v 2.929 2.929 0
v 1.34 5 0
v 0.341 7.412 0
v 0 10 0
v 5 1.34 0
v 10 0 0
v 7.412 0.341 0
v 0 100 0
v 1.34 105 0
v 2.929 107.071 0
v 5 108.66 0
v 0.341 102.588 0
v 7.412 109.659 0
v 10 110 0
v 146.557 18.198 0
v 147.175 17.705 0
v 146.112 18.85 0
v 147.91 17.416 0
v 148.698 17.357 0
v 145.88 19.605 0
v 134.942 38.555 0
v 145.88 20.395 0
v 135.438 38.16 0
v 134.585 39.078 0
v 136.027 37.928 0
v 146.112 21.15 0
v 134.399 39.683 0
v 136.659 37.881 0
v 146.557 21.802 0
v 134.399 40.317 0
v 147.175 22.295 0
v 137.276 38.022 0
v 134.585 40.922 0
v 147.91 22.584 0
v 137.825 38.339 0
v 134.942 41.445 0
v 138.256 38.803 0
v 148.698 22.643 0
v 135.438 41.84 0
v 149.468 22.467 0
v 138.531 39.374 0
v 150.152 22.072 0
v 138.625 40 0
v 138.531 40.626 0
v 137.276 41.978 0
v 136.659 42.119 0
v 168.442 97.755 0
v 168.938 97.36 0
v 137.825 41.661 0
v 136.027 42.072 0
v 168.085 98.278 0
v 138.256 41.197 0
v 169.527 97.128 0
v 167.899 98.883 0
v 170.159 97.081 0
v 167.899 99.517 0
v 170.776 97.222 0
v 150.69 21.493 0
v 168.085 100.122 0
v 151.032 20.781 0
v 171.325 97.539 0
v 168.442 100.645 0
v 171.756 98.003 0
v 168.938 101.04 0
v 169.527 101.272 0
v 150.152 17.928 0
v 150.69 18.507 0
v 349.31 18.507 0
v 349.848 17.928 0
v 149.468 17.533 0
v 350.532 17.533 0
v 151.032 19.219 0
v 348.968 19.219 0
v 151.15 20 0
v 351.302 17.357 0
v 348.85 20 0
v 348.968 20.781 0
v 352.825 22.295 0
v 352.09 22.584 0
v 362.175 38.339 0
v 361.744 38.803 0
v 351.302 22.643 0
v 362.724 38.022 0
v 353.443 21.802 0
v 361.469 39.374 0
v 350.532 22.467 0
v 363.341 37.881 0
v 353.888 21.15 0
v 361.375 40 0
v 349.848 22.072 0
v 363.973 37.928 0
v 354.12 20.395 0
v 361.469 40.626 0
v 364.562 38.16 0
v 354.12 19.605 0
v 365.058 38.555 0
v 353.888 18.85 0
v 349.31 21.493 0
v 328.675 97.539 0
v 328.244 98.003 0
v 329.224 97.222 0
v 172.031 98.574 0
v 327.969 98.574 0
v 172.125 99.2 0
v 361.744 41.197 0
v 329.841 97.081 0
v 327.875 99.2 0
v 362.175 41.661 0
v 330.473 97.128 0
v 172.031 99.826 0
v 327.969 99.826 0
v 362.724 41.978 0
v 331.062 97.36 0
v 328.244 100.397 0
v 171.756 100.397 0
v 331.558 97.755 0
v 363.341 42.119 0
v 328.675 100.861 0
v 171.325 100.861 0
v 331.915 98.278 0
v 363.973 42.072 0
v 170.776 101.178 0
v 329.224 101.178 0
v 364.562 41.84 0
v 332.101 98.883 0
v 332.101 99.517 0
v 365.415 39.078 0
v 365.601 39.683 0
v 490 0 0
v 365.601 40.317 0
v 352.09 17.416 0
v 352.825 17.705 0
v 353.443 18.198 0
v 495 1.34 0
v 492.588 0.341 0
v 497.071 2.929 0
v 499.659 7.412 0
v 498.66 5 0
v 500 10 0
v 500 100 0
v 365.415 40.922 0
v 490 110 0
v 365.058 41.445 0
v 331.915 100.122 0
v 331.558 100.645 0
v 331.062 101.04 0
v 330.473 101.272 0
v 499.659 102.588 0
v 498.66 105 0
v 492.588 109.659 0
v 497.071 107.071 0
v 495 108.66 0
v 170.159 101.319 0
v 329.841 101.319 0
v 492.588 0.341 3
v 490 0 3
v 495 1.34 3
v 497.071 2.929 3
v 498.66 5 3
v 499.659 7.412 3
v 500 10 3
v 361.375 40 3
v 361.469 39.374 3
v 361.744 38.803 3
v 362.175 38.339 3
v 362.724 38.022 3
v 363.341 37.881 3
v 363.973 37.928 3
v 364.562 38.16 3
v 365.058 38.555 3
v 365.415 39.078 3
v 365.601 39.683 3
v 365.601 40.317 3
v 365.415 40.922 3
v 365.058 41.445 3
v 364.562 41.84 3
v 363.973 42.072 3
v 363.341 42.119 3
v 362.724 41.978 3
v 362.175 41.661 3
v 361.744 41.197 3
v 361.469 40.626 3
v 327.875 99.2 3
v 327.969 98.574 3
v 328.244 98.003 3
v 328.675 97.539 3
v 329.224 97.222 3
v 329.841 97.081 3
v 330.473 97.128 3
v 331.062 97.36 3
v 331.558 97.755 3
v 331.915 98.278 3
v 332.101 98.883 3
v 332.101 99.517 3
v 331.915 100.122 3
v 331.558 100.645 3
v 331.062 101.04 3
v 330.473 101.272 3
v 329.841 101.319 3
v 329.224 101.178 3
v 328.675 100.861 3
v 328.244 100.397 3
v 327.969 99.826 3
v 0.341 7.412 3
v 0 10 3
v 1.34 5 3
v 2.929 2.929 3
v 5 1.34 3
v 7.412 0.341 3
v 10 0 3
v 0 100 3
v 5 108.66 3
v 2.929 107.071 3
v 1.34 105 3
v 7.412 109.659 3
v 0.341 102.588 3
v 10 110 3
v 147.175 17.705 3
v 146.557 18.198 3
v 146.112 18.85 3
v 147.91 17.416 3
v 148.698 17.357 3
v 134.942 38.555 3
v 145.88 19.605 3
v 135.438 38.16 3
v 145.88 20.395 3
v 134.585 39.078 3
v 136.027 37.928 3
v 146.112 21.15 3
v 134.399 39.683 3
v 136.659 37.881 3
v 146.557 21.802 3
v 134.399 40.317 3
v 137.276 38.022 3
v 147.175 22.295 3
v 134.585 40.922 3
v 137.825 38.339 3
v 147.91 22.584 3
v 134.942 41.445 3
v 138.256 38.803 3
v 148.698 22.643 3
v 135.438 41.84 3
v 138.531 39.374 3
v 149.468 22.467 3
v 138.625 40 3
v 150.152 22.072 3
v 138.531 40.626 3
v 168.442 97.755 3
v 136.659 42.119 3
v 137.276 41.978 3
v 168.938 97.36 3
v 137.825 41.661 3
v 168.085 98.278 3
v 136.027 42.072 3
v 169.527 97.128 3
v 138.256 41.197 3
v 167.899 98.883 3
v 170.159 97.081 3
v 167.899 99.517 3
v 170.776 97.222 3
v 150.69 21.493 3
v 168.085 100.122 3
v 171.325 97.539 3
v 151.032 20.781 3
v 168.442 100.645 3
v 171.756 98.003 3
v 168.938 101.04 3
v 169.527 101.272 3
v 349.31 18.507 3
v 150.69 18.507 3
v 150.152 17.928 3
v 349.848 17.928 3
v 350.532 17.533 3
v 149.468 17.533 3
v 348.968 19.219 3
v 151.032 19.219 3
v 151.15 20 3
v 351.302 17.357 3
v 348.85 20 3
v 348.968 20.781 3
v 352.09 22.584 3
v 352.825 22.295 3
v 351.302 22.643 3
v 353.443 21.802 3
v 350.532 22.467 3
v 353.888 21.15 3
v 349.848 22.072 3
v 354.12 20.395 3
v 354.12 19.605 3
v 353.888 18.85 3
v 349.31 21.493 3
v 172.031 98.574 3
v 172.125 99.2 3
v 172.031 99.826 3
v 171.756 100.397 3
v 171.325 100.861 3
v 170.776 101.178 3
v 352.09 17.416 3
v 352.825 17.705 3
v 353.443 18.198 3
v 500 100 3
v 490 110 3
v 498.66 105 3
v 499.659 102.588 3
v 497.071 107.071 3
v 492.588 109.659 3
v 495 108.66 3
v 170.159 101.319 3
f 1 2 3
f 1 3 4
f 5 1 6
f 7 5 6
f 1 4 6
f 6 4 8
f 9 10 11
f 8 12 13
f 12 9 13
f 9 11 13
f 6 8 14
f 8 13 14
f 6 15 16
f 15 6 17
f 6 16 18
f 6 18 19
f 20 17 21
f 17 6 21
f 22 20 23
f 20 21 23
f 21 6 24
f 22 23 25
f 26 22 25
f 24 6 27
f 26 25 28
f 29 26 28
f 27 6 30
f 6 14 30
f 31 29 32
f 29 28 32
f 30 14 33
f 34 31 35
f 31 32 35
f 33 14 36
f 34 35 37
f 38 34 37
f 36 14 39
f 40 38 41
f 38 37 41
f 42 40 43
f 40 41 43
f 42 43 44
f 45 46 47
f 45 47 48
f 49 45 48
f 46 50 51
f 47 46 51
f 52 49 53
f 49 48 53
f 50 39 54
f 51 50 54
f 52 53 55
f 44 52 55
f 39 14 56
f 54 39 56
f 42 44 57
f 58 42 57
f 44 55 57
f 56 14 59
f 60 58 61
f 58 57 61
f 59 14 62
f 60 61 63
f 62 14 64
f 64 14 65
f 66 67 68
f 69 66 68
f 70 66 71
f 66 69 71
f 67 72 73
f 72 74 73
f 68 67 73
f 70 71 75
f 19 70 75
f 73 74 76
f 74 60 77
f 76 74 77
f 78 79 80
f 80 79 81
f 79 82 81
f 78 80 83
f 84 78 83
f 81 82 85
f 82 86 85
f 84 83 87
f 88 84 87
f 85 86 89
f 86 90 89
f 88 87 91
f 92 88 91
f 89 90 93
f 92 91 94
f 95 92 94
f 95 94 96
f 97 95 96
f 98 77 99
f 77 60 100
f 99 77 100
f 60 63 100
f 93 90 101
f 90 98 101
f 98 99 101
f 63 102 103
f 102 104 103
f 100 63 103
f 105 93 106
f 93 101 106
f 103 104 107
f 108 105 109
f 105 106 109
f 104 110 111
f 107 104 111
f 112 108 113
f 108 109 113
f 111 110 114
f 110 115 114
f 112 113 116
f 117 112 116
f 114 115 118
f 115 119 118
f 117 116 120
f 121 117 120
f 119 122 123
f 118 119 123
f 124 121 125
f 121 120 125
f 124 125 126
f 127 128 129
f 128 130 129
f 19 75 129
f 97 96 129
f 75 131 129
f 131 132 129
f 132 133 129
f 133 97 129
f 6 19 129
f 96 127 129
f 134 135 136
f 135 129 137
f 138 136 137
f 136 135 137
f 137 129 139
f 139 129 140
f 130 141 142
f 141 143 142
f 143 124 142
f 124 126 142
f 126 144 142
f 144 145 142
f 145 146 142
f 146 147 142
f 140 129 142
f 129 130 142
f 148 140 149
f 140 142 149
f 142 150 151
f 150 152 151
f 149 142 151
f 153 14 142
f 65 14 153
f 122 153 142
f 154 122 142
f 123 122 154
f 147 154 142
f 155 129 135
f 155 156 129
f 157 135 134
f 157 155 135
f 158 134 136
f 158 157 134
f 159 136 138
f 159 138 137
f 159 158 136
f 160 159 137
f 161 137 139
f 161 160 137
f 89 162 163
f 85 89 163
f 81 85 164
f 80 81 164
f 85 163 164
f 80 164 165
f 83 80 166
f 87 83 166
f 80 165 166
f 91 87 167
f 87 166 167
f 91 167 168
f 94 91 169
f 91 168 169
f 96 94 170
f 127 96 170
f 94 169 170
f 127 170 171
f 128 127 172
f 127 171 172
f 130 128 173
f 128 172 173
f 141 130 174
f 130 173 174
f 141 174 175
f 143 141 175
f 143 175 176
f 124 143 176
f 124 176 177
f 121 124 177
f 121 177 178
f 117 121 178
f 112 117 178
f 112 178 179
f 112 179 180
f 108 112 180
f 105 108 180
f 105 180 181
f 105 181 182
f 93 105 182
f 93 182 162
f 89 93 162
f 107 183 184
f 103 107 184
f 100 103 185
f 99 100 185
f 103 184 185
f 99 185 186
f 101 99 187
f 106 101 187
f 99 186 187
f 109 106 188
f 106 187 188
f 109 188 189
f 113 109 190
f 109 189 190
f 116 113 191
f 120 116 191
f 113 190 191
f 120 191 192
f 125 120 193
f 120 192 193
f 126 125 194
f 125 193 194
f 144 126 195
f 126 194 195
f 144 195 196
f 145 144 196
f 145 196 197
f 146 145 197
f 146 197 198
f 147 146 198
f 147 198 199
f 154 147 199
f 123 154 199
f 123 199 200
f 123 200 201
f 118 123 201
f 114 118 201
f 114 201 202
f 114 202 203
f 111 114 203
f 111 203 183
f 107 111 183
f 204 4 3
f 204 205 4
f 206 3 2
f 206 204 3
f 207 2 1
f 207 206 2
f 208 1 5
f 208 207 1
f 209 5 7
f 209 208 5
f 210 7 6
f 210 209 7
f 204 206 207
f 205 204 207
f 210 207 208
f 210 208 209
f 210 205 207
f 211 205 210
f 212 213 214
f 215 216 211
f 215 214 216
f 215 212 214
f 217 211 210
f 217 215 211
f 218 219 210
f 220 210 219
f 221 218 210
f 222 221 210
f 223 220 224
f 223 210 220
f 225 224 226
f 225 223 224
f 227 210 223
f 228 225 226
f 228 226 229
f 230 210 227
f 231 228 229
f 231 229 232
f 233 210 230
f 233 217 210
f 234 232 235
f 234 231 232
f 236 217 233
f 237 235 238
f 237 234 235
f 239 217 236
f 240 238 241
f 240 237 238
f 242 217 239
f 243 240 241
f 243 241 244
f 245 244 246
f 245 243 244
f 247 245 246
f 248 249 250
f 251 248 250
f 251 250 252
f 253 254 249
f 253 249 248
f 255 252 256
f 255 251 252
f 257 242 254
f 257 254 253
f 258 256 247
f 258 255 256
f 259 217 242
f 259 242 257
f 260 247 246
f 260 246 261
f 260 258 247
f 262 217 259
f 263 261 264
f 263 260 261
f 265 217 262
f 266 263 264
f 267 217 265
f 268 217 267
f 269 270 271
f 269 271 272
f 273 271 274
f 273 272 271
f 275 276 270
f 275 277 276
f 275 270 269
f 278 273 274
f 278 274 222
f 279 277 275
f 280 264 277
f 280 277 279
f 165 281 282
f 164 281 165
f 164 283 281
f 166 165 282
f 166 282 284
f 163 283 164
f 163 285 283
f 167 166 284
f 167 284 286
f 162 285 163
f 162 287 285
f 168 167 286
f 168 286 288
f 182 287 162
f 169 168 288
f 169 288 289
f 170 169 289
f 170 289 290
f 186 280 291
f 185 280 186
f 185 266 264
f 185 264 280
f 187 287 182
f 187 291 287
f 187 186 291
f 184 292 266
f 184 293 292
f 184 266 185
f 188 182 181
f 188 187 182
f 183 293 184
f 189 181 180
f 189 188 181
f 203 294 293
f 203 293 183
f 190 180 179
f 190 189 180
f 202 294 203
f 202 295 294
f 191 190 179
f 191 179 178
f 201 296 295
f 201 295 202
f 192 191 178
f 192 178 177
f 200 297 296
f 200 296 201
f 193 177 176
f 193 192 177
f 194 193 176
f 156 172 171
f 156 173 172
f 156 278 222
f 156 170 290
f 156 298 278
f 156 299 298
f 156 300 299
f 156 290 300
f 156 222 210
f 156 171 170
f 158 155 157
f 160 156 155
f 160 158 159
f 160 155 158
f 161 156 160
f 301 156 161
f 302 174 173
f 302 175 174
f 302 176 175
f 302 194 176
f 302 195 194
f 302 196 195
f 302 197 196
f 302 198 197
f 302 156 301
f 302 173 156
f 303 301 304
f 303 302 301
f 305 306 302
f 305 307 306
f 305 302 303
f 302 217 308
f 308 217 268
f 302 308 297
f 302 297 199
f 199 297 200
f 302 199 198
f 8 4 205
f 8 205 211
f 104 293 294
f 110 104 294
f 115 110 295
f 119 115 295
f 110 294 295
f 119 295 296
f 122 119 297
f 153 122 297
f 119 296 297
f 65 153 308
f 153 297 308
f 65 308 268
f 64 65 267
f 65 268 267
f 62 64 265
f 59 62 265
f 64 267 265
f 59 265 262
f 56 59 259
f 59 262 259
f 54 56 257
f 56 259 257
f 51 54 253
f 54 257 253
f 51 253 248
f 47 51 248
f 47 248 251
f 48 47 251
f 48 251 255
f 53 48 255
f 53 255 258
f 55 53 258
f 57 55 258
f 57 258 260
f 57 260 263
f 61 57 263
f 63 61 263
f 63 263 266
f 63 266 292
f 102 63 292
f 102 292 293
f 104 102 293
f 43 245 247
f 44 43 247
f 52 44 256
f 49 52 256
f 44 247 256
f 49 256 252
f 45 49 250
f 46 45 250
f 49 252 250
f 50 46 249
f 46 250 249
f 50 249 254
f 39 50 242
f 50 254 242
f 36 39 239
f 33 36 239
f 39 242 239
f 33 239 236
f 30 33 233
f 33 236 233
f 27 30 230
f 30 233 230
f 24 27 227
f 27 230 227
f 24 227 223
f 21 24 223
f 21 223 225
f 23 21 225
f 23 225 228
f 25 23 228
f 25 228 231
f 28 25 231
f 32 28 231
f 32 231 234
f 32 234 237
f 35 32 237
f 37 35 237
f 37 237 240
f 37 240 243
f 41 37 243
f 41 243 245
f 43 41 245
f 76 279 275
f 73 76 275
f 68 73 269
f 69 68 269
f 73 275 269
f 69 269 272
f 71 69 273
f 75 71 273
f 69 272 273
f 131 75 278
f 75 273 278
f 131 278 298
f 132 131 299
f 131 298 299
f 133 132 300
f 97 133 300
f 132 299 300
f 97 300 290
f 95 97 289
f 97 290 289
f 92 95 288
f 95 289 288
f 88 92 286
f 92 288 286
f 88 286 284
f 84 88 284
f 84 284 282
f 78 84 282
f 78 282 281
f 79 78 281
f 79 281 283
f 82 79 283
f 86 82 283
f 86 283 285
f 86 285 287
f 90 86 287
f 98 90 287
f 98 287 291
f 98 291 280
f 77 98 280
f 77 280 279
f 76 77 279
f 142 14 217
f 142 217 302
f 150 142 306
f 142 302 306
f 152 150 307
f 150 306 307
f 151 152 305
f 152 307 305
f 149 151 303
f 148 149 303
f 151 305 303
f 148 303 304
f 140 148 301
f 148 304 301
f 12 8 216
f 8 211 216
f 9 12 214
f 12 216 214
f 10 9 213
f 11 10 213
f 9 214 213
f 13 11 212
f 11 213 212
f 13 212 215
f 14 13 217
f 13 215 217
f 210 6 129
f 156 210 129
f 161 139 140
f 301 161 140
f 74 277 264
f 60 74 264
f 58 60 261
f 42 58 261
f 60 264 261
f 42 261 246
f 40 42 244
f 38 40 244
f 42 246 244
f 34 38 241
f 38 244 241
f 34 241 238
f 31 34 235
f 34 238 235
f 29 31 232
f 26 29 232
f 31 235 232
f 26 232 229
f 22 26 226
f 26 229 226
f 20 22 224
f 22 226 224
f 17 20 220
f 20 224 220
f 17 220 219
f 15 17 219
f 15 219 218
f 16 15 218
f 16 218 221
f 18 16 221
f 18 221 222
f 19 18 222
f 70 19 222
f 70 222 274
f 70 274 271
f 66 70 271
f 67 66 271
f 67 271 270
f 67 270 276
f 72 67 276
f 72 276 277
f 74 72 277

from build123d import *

# Parameters (mm, degrees)
SKETCH1_W           = 500
SKETCH1_H           = 110
BOSS_EXTRUDE1_DEPTH = 3
SKETCH2_R           = 2.65
SKETCH2_R_2         = 2.125
CUT_EXTRUDE1_DEPTH  = 10
SKETCH3_R           = 2.125
CUT_EXTRUDE2_DEPTH  = 10
FILLET1_R           = 10


with BuildPart() as part:
    # Sketch1 → Boss-Extrude1 (new body)
    with BuildSketch(Plane.XY):
        with Locations((250, 55)):
            Rectangle(SKETCH1_W, SKETCH1_H)
    extrude(amount=BOSS_EXTRUDE1_DEPTH)

    # Sketch2 → Cut-Extrude1 (cut)
    with BuildSketch(Plane.XY.offset(3)):
        with Locations((148.5, 20)):
            Circle(SKETCH2_R)
        with Locations((136.5, 40)):
            Circle(SKETCH2_R_2)
        with Locations(Location((363.5, 40, 0), (0, 0, 180))):
            Circle(SKETCH2_R_2)
        with Locations(Location((351.5, 20, 0), (0, 0, 180))):
            Circle(SKETCH2_R)
    extrude(amount=-CUT_EXTRUDE1_DEPTH, mode=Mode.SUBTRACT)

    # Sketch3 → Cut-Extrude2 (cut)
    with BuildSketch(Plane.XY.offset(3)):
        with Locations((170, 99.2)):
            Circle(SKETCH3_R)
        with Locations(Location((330, 99.2, 0), (0, 0, 180))):
            Circle(SKETCH3_R)
    extrude(amount=-CUT_EXTRUDE2_DEPTH, mode=Mode.SUBTRACT)

    # Fillet1
    fillet1_edges = [part.edges().sort_by_distance(p)[0] for p in [
        (0, 110, 1.5),
        (500, 110, 1.5),
        (500, 0, 1.5),
        (0, 0, 1.5),
    ]]
    fillet(fillet1_edges, radius=FILLET1_R)


solid = part.part
